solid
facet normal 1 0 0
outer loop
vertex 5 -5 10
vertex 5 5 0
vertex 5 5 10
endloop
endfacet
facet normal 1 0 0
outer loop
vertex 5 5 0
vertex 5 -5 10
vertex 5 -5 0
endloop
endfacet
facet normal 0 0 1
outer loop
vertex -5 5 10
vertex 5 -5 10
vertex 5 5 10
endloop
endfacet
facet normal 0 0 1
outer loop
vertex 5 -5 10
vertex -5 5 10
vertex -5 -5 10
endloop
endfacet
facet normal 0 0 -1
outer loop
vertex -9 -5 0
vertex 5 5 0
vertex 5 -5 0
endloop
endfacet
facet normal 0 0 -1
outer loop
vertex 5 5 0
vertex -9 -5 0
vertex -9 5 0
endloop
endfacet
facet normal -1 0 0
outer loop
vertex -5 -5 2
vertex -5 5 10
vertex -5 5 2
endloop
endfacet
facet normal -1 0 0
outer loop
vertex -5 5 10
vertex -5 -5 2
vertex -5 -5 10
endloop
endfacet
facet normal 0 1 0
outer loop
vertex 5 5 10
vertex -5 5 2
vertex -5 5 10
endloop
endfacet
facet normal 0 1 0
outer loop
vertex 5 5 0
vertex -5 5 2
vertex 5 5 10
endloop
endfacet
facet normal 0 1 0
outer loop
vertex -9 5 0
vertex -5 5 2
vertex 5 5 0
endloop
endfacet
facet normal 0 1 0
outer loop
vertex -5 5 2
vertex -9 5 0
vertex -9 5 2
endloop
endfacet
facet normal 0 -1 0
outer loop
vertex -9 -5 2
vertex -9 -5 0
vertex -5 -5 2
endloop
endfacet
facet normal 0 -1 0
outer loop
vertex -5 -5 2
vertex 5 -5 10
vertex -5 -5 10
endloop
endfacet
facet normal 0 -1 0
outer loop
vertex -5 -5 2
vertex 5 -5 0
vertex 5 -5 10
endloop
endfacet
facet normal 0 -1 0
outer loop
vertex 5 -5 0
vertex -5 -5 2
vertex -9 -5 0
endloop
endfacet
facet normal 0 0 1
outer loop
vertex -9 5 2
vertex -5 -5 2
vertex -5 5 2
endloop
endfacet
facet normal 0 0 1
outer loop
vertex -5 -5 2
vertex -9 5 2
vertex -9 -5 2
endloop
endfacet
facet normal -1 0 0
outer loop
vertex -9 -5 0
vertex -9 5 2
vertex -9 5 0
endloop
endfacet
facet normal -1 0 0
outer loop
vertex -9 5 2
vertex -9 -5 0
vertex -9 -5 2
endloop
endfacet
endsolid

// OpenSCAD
translate([0, 0, 5]) color([0,1,0,0.9]) cube([10, 10, 10], center=true);
translate([-5.25, -4.75, 1]) color([1,0,0]) cube([0.5, 0.5, 2], center=true);
translate([-5.25, -4.25, 1]) color([1,0,0]) cube([0.5, 0.5, 2], center=true);
translate([-5.25, -3.75, 1]) color([1,0,0]) cube([0.5, 0.5, 2], center=true);
translate([-5.25, -3.25, 1]) color([1,0,0]) cube([0.5, 0.5, 2], center=true);
translate([-5.25, -2.75, 1]) color([1,0,0]) cube([0.5, 0.5, 2], center=true);
translate([-5.25, -2.25, 1]) color([1,0,0]) cube([0.5, 0.5, 2], center=true);
translate([-5.25, -1.75, 1]) color([1,0,0]) cube([0.5, 0.5, 2], center=true);
translate([-5.25, -1.25, 1]) color([1,0,0]) cube([0.5, 0.5, 2], center=true);
translate([-5.25, -0.75, 1]) color([1,0,0]) cube([0.5, 0.5, 2], center=true);
translate([-5.25, -0.25, 1]) color([1,0,0]) cube([0.5, 0.5, 2], center=true);
translate([-5.25, 0.25, 1]) color([1,0,0]) cube([0.5, 0.5, 2], center=true);
translate([-5.25, 0.75, 1]) color([1,0,0]) cube([0.5, 0.5, 2], center=true);
translate([-5.25, 1.25, 1]) color([1,0,0]) cube([0.5, 0.5, 2], center=true);
translate([-5.25, 1.75, 1]) color([1,0,0]) cube([0.5, 0.5, 2], center=true);
translate([-5.25, 2.25, 1]) color([1,0,0]) cube([0.5, 0.5, 2], center=true);
translate([-5.25, 2.75, 1]) color([1,0,0]) cube([0.5, 0.5, 2], center=true);
translate([-5.25, 3.25, 1]) color([1,0,0]) cube([0.5, 0.5, 2], center=true);
translate([-5.25, 3.75, 1]) color([1,0,0]) cube([0.5, 0.5, 2], center=true);
translate([-5.25, 4.25, 1]) color([1,0,0]) cube([0.5, 0.5, 2], center=true);
translate([-5.25, 4.75, 1]) color([1,0,0]) cube([0.5, 0.5, 2], center=true);
translate([-5.75, -4.75, 1]) color([1,0,0]) cube([0.5, 0.5, 2], center=true);
translate([-5.75, -4.25, 1]) color([1,0,0]) cube([0.5, 0.5, 2], center=true);
translate([-5.75, -3.75, 1]) color([1,0,0]) cube([0.5, 0.5, 2], center=true);
translate([-5.75, -3.25, 1]) color([1,0,0]) cube([0.5, 0.5, 2], center=true);
translate([-5.75, -2.75, 1]) color([1,0,0]) cube([0.5, 0.5, 2], center=true);
translate([-5.75, -2.25, 1]) color([1,0,0]) cube([0.5, 0.5, 2], center=true);
translate([-5.75, -1.75, 1]) color([1,0,0]) cube([0.5, 0.5, 2], center=true);
translate([-5.75, -1.25, 1]) color([1,0,0]) cube([0.5, 0.5, 2], center=true);
translate([-5.75, -0.75, 1]) color([1,0,0]) cube([0.5, 0.5, 2], center=true);
translate([-5.75, -0.25, 1]) color([1,0,0]) cube([0.5, 0.5, 2], center=true);
translate([-5.75, 0.25, 1]) color([1,0,0]) cube([0.5, 0.5, 2], center=true);
translate([-5.75, 0.75, 1]) color([1,0,0]) cube([0.5, 0.5, 2], center=true);
translate([-5.75, 1.25, 1]) color([1,0,0]) cube([0.5, 0.5, 2], center=true);
translate([-5.75, 1.75, 1]) color([1,0,0]) cube([0.5, 0.5, 2], center=true);
translate([-5.75, 2.25, 1]) color([1,0,0]) cube([0.5, 0.5, 2], center=true);
translate([-5.75, 2.75, 1]) color([1,0,0]) cube([0.5, 0.5, 2], center=true);
translate([-5.75, 3.25, 1]) color([1,0,0]) cube([0.5, 0.5, 2], center=true);
translate([-5.75, 3.75, 1]) color([1,0,0]) cube([0.5, 0.5, 2], center=true);
translate([-5.75, 4.25, 1]) color([1,0,0]) cube([0.5, 0.5, 2], center=true);
translate([-5.75, 4.75, 1]) color([1,0,0]) cube([0.5, 0.5, 2], center=true);
translate([-6.25, -4.75, 1]) color([1,0,0]) cube([0.5, 0.5, 2], center=true);
translate([-6.25, -4.25, 1]) color([1,0,0]) cube([0.5, 0.5, 2], center=true);
translate([-6.25, -3.75, 1]) color([1,0,0]) cube([0.5, 0.5, 2], center=true);
translate([-6.25, -3.25, 1]) color([1,0,0]) cube([0.5, 0.5, 2], center=true);
translate([-6.25, -2.75, 1]) color([1,0,0]) cube([0.5, 0.5, 2], center=true);
translate([-6.25, -2.25, 1]) color([1,0,0]) cube([0.5, 0.5, 2], center=true);
translate([-6.25, -1.75, 1]) color([1,0,0]) cube([0.5, 0.5, 2], center=true);
translate([-6.25, -1.25, 1]) color([1,0,0]) cube([0.5, 0.5, 2], center=true);
translate([-6.25, -0.75, 1]) color([1,0,0]) cube([0.5, 0.5, 2], center=true);
translate([-6.25, -0.25, 1]) color([1,0,0]) cube([0.5, 0.5, 2], center=true);
translate([-6.25, 0.25, 1]) color([1,0,0]) cube([0.5, 0.5, 2], center=true);
translate([-6.25, 0.75, 1]) color([1,0,0]) cube([0.5, 0.5, 2], center=true);
translate([-6.25, 1.25, 1]) color([1,0,0]) cube([0.5, 0.5, 2], center=true);
translate([-6.25, 1.75, 1]) color([1,0,0]) cube([0.5, 0.5, 2], center=true);
translate([-6.25, 2.25, 1]) color([1,0,0]) cube([0.5, 0.5, 2], center=true);
translate([-6.25, 2.75, 1]) color([1,0,0]) cube([0.5, 0.5, 2], center=true);
translate([-6.25, 3.25, 1]) color([1,0,0]) cube([0.5, 0.5, 2], center=true);
translate([-6.25, 3.75, 1]) color([1,0,0]) cube([0.5, 0.5, 2], center=true);
translate([-6.25, 4.25, 1]) color([1,0,0]) cube([0.5, 0.5, 2], center=true);
translate([-6.25, 4.75, 1]) color([1,0,0]) cube([0.5, 0.5, 2], center=true);
translate([-6.75, -4.75, 1]) color([1,0,0]) cube([0.5, 0.5, 2], center=true);
translate([-6.75, -4.25, 1]) color([1,0,0]) cube([0.5, 0.5, 2], center=true);
translate([-6.75, -3.75, 1]) color([1,0,0]) cube([0.5, 0.5, 2], center=true);
translate([-6.75, -3.25, 1]) color([1,0,0]) cube([0.5, 0.5, 2], center=true);
translate([-6.75, -2.75, 1]) color([1,0,0]) cube([0.5, 0.5, 2], center=true);
translate([-6.75, -2.25, 1]) color([1,0,0]) cube([0.5, 0.5, 2], center=true);
translate([-6.75, -1.75, 1]) color([1,0,0]) cube([0.5, 0.5, 2], center=true);
translate([-6.75, -1.25, 1]) color([1,0,0]) cube([0.5, 0.5, 2], center=true);
translate([-6.75, -0.75, 1]) color([1,0,0]) cube([0.5, 0.5, 2], center=true);
translate([-6.75, -0.25, 1]) color([1,0,0]) cube([0.5, 0.5, 2], center=true);
translate([-6.75, 0.25, 1]) color([1,0,0]) cube([0.5, 0.5, 2], center=true);
translate([-6.75, 0.75, 1]) color([1,0,0]) cube([0.5, 0.5, 2], center=true);
translate([-6.75, 1.25, 1]) color([1,0,0]) cube([0.5, 0.5, 2], center=true);
translate([-6.75, 1.75, 1]) color([1,0,0]) cube([0.5, 0.5, 2], center=true);
translate([-6.75, 2.25, 1]) color([1,0,0]) cube([0.5, 0.5, 2], center=true);
translate([-6.75, 2.75, 1]) color([1,0,0]) cube([0.5, 0.5, 2], center=true);
translate([-6.75, 3.25, 1]) color([1,0,0]) cube([0.5, 0.5, 2], center=true);
translate([-6.75, 3.75, 1]) color([1,0,0]) cube([0.5, 0.5, 2], center=true);
translate([-6.75, 4.25, 1]) color([1,0,0]) cube([0.5, 0.5, 2], center=true);
translate([-6.75, 4.75, 1]) color([1,0,0]) cube([0.5, 0.5, 2], center=true);
translate([-7.25, -4.75, 1]) color([1,0,0]) cube([0.5, 0.5, 2], center=true);
translate([-7.25, -4.25, 1]) color([1,0,0]) cube([0.5, 0.5, 2], center=true);
translate([-7.25, -3.75, 1]) color([1,0,0]) cube([0.5, 0.5, 2], center=true);
translate([-7.25, -3.25, 1]) color([1,0,0]) cube([0.5, 0.5, 2], center=true);
translate([-7.25, -2.75, 1]) color([1,0,0]) cube([0.5, 0.5, 2], center=true);
translate([-7.25, -2.25, 1]) color([1,0,0]) cube([0.5, 0.5, 2], center=true);
translate([-7.25, -1.75, 1]) color([1,0,0]) cube([0.5, 0.5, 2], center=true);
translate([-7.25, -1.25, 1]) color([1,0,0]) cube([0.5, 0.5, 2], center=true);
translate([-7.25, -0.75, 1]) color([1,0,0]) cube([0.5, 0.5, 2], center=true);
translate([-7.25, -0.25, 1]) color([1,0,0]) cube([0.5, 0.5, 2], center=true);
translate([-7.25, 0.25, 1]) color([1,0,0]) cube([0.5, 0.5, 2], center=true);
translate([-7.25, 0.75, 1]) color([1,0,0]) cube([0.5, 0.5, 2], center=true);
translate([-7.25, 1.25, 1]) color([1,0,0]) cube([0.5, 0.5, 2], center=true);
translate([-7.25, 1.75, 1]) color([1,0,0]) cube([0.5, 0.5, 2], center=true);
translate([-7.25, 2.25, 1]) color([1,0,0]) cube([0.5, 0.5, 2], center=true);
translate([-7.25, 2.75, 1]) color([1,0,0]) cube([0.5, 0.5, 2], center=true);
translate([-7.25, 3.25, 1]) color([1,0,0]) cube([0.5, 0.5, 2], center=true);
translate([-7.25, 3.75, 1]) color([1,0,0]) cube([0.5, 0.5, 2], center=true);
translate([-7.25, 4.25, 1]) color([1,0,0]) cube([0.5, 0.5, 2], center=true);
translate([-7.25, 4.75, 1]) color([1,0,0]) cube([0.5, 0.5, 2], center=true);
translate([-7.75, -4.75, 1]) color([1,0,0]) cube([0.5, 0.5, 2], center=true);
translate([-7.75, -4.25, 1]) color([1,0,0]) cube([0.5, 0.5, 2], center=true);
translate([-7.75, -3.75, 1]) color([1,0,0]) cube([0.5, 0.5, 2], center=true);
translate([-7.75, -3.25, 1]) color([1,0,0]) cube([0.5, 0.5, 2], center=true);
translate([-7.75, -2.75, 1]) color([1,0,0]) cube([0.5, 0.5, 2], center=true);
translate([-7.75, -2.25, 1]) color([1,0,0]) cube([0.5, 0.5, 2], center=true);
translate([-7.75, -1.75, 1]) color([1,0,0]) cube([0.5, 0.5, 2], center=true);
translate([-7.75, -1.25, 1]) color([1,0,0]) cube([0.5, 0.5, 2], center=true);
translate([-7.75, -0.75, 1]) color([1,0,0]) cube([0.5, 0.5, 2], center=true);
translate([-7.75, -0.25, 1]) color([1,0,0]) cube([0.5, 0.5, 2], center=true);
translate([-7.75, 0.25, 1]) color([1,0,0]) cube([0.5, 0.5, 2], center=true);
translate([-7.75, 0.75, 1]) color([1,0,0]) cube([0.5, 0.5, 2], center=true);
translate([-7.75, 1.25, 1]) color([1,0,0]) cube([0.5, 0.5, 2], center=true);
translate([-7.75, 1.75, 1]) color([1,0,0]) cube([0.5, 0.5, 2], center=true);
translate([-7.75, 2.25, 1]) color([1,0,0]) cube([0.5, 0.5, 2], center=true);
translate([-7.75, 2.75, 1]) color([1,0,0]) cube([0.5, 0.5, 2], center=true);
translate([-7.75, 3.25, 1]) color([1,0,0]) cube([0.5, 0.5, 2], center=true);
translate([-7.75, 3.75, 1]) color([1,0,0]) cube([0.5, 0.5, 2], center=true);
translate([-7.75, 4.25, 1]) color([1,0,0]) cube([0.5, 0.5, 2], center=true);
translate([-7.75, 4.75, 1]) color([1,0,0]) cube([0.5, 0.5, 2], center=true);
translate([-8.25, -4.75, 1]) color([1,0,0]) cube([0.5, 0.5, 2], center=true);
translate([-8.25, -4.25, 1]) color([1,0,0]) cube([0.5, 0.5, 2], center=true);
translate([-8.25, -3.75, 1]) color([1,0,0]) cube([0.5, 0.5, 2], center=true);
translate([-8.25, -3.25, 1]) color([1,0,0]) cube([0.5, 0.5, 2], center=true);
translate([-8.25, -2.75, 1]) color([1,0,0]) cube([0.5, 0.5, 2], center=true);
translate([-8.25, -2.25, 1]) color([1,0,0]) cube([0.5, 0.5, 2], center=true);
translate([-8.25, -1.75, 1]) color([1,0,0]) cube([0.5, 0.5, 2], center=true);
translate([-8.25, -1.25, 1]) color([1,0,0]) cube([0.5, 0.5, 2], center=true);
translate([-8.25, -0.75, 1]) color([1,0,0]) cube([0.5, 0.5, 2], center=true);
translate([-8.25, -0.25, 1]) color([1,0,0]) cube([0.5, 0.5, 2], center=true);
translate([-8.25, 0.25, 1]) color([1,0,0]) cube([0.5, 0.5, 2], center=true);
translate([-8.25, 0.75, 1]) color([1,0,0]) cube([0.5, 0.5, 2], center=true);
translate([-8.25, 1.25, 1]) color([1,0,0]) cube([0.5, 0.5, 2], center=true);
translate([-8.25, 1.75, 1]) color([1,0,0]) cube([0.5, 0.5, 2], center=true);
translate([-8.25, 2.25, 1]) color([1,0,0]) cube([0.5, 0.5, 2], center=true);
translate([-8.25, 2.75, 1]) color([1,0,0]) cube([0.5, 0.5, 2], center=true);
translate([-8.25, 3.25, 1]) color([1,0,0]) cube([0.5, 0.5, 2], center=true);
translate([-8.25, 3.75, 1]) color([1,0,0]) cube([0.5, 0.5, 2], center=true);
translate([-8.25, 4.25, 1]) color([1,0,0]) cube([0.5, 0.5, 2], center=true);
translate([-8.25, 4.75, 1]) color([1,0,0]) cube([0.5, 0.5, 2], center=true);
translate([-8.75, -4.75, 1]) color([1,0,0]) cube([0.5, 0.5, 2], center=true);
translate([-8.75, -4.25, 1]) color([1,0,0]) cube([0.5, 0.5, 2], center=true);
translate([-8.75, -3.75, 1]) color([1,0,0]) cube([0.5, 0.5, 2], center=true);
translate([-8.75, -3.25, 1]) color([1,0,0]) cube([0.5, 0.5, 2], center=true);
translate([-8.75, -2.75, 1]) color([1,0,0]) cube([0.5, 0.5, 2], center=true);
translate([-8.75, -2.25, 1]) color([1,0,0]) cube([0.5, 0.5, 2], center=true);
translate([-8.75, -1.75, 1]) color([1,0,0]) cube([0.5, 0.5, 2], center=true);
translate([-8.75, -1.25, 1]) color([1,0,0]) cube([0.5, 0.5, 2], center=true);
translate([-8.75, -0.75, 1]) color([1,0,0]) cube([0.5, 0.5, 2], center=true);
translate([-8.75, -0.25, 1]) color([1,0,0]) cube([0.5, 0.5, 2], center=true);
translate([-8.75, 0.25, 1]) color([1,0,0]) cube([0.5, 0.5, 2], center=true);
translate([-8.75, 0.75, 1]) color([1,0,0]) cube([0.5, 0.5, 2], center=true);
translate([-8.75, 1.25, 1]) color([1,0,0]) cube([0.5, 0.5, 2], center=true);
translate([-8.75, 1.75, 1]) color([1,0,0]) cube([0.5, 0.5, 2], center=true);
translate([-8.75, 2.25, 1]) color([1,0,0]) cube([0.5, 0.5, 2], center=true);
translate([-8.75, 2.75, 1]) color([1,0,0]) cube([0.5, 0.5, 2], center=true);
translate([-8.75, 3.25, 1]) color([1,0,0]) cube([0.5, 0.5, 2], center=true);
translate([-8.75, 3.75, 1]) color([1,0,0]) cube([0.5, 0.5, 2], center=true);
translate([-8.75, 4.25, 1]) color([1,0,0]) cube([0.5, 0.5, 2], center=true);
translate([-8.75, 4.75, 1]) color([1,0,0]) cube([0.5, 0.5, 2], center=true);
